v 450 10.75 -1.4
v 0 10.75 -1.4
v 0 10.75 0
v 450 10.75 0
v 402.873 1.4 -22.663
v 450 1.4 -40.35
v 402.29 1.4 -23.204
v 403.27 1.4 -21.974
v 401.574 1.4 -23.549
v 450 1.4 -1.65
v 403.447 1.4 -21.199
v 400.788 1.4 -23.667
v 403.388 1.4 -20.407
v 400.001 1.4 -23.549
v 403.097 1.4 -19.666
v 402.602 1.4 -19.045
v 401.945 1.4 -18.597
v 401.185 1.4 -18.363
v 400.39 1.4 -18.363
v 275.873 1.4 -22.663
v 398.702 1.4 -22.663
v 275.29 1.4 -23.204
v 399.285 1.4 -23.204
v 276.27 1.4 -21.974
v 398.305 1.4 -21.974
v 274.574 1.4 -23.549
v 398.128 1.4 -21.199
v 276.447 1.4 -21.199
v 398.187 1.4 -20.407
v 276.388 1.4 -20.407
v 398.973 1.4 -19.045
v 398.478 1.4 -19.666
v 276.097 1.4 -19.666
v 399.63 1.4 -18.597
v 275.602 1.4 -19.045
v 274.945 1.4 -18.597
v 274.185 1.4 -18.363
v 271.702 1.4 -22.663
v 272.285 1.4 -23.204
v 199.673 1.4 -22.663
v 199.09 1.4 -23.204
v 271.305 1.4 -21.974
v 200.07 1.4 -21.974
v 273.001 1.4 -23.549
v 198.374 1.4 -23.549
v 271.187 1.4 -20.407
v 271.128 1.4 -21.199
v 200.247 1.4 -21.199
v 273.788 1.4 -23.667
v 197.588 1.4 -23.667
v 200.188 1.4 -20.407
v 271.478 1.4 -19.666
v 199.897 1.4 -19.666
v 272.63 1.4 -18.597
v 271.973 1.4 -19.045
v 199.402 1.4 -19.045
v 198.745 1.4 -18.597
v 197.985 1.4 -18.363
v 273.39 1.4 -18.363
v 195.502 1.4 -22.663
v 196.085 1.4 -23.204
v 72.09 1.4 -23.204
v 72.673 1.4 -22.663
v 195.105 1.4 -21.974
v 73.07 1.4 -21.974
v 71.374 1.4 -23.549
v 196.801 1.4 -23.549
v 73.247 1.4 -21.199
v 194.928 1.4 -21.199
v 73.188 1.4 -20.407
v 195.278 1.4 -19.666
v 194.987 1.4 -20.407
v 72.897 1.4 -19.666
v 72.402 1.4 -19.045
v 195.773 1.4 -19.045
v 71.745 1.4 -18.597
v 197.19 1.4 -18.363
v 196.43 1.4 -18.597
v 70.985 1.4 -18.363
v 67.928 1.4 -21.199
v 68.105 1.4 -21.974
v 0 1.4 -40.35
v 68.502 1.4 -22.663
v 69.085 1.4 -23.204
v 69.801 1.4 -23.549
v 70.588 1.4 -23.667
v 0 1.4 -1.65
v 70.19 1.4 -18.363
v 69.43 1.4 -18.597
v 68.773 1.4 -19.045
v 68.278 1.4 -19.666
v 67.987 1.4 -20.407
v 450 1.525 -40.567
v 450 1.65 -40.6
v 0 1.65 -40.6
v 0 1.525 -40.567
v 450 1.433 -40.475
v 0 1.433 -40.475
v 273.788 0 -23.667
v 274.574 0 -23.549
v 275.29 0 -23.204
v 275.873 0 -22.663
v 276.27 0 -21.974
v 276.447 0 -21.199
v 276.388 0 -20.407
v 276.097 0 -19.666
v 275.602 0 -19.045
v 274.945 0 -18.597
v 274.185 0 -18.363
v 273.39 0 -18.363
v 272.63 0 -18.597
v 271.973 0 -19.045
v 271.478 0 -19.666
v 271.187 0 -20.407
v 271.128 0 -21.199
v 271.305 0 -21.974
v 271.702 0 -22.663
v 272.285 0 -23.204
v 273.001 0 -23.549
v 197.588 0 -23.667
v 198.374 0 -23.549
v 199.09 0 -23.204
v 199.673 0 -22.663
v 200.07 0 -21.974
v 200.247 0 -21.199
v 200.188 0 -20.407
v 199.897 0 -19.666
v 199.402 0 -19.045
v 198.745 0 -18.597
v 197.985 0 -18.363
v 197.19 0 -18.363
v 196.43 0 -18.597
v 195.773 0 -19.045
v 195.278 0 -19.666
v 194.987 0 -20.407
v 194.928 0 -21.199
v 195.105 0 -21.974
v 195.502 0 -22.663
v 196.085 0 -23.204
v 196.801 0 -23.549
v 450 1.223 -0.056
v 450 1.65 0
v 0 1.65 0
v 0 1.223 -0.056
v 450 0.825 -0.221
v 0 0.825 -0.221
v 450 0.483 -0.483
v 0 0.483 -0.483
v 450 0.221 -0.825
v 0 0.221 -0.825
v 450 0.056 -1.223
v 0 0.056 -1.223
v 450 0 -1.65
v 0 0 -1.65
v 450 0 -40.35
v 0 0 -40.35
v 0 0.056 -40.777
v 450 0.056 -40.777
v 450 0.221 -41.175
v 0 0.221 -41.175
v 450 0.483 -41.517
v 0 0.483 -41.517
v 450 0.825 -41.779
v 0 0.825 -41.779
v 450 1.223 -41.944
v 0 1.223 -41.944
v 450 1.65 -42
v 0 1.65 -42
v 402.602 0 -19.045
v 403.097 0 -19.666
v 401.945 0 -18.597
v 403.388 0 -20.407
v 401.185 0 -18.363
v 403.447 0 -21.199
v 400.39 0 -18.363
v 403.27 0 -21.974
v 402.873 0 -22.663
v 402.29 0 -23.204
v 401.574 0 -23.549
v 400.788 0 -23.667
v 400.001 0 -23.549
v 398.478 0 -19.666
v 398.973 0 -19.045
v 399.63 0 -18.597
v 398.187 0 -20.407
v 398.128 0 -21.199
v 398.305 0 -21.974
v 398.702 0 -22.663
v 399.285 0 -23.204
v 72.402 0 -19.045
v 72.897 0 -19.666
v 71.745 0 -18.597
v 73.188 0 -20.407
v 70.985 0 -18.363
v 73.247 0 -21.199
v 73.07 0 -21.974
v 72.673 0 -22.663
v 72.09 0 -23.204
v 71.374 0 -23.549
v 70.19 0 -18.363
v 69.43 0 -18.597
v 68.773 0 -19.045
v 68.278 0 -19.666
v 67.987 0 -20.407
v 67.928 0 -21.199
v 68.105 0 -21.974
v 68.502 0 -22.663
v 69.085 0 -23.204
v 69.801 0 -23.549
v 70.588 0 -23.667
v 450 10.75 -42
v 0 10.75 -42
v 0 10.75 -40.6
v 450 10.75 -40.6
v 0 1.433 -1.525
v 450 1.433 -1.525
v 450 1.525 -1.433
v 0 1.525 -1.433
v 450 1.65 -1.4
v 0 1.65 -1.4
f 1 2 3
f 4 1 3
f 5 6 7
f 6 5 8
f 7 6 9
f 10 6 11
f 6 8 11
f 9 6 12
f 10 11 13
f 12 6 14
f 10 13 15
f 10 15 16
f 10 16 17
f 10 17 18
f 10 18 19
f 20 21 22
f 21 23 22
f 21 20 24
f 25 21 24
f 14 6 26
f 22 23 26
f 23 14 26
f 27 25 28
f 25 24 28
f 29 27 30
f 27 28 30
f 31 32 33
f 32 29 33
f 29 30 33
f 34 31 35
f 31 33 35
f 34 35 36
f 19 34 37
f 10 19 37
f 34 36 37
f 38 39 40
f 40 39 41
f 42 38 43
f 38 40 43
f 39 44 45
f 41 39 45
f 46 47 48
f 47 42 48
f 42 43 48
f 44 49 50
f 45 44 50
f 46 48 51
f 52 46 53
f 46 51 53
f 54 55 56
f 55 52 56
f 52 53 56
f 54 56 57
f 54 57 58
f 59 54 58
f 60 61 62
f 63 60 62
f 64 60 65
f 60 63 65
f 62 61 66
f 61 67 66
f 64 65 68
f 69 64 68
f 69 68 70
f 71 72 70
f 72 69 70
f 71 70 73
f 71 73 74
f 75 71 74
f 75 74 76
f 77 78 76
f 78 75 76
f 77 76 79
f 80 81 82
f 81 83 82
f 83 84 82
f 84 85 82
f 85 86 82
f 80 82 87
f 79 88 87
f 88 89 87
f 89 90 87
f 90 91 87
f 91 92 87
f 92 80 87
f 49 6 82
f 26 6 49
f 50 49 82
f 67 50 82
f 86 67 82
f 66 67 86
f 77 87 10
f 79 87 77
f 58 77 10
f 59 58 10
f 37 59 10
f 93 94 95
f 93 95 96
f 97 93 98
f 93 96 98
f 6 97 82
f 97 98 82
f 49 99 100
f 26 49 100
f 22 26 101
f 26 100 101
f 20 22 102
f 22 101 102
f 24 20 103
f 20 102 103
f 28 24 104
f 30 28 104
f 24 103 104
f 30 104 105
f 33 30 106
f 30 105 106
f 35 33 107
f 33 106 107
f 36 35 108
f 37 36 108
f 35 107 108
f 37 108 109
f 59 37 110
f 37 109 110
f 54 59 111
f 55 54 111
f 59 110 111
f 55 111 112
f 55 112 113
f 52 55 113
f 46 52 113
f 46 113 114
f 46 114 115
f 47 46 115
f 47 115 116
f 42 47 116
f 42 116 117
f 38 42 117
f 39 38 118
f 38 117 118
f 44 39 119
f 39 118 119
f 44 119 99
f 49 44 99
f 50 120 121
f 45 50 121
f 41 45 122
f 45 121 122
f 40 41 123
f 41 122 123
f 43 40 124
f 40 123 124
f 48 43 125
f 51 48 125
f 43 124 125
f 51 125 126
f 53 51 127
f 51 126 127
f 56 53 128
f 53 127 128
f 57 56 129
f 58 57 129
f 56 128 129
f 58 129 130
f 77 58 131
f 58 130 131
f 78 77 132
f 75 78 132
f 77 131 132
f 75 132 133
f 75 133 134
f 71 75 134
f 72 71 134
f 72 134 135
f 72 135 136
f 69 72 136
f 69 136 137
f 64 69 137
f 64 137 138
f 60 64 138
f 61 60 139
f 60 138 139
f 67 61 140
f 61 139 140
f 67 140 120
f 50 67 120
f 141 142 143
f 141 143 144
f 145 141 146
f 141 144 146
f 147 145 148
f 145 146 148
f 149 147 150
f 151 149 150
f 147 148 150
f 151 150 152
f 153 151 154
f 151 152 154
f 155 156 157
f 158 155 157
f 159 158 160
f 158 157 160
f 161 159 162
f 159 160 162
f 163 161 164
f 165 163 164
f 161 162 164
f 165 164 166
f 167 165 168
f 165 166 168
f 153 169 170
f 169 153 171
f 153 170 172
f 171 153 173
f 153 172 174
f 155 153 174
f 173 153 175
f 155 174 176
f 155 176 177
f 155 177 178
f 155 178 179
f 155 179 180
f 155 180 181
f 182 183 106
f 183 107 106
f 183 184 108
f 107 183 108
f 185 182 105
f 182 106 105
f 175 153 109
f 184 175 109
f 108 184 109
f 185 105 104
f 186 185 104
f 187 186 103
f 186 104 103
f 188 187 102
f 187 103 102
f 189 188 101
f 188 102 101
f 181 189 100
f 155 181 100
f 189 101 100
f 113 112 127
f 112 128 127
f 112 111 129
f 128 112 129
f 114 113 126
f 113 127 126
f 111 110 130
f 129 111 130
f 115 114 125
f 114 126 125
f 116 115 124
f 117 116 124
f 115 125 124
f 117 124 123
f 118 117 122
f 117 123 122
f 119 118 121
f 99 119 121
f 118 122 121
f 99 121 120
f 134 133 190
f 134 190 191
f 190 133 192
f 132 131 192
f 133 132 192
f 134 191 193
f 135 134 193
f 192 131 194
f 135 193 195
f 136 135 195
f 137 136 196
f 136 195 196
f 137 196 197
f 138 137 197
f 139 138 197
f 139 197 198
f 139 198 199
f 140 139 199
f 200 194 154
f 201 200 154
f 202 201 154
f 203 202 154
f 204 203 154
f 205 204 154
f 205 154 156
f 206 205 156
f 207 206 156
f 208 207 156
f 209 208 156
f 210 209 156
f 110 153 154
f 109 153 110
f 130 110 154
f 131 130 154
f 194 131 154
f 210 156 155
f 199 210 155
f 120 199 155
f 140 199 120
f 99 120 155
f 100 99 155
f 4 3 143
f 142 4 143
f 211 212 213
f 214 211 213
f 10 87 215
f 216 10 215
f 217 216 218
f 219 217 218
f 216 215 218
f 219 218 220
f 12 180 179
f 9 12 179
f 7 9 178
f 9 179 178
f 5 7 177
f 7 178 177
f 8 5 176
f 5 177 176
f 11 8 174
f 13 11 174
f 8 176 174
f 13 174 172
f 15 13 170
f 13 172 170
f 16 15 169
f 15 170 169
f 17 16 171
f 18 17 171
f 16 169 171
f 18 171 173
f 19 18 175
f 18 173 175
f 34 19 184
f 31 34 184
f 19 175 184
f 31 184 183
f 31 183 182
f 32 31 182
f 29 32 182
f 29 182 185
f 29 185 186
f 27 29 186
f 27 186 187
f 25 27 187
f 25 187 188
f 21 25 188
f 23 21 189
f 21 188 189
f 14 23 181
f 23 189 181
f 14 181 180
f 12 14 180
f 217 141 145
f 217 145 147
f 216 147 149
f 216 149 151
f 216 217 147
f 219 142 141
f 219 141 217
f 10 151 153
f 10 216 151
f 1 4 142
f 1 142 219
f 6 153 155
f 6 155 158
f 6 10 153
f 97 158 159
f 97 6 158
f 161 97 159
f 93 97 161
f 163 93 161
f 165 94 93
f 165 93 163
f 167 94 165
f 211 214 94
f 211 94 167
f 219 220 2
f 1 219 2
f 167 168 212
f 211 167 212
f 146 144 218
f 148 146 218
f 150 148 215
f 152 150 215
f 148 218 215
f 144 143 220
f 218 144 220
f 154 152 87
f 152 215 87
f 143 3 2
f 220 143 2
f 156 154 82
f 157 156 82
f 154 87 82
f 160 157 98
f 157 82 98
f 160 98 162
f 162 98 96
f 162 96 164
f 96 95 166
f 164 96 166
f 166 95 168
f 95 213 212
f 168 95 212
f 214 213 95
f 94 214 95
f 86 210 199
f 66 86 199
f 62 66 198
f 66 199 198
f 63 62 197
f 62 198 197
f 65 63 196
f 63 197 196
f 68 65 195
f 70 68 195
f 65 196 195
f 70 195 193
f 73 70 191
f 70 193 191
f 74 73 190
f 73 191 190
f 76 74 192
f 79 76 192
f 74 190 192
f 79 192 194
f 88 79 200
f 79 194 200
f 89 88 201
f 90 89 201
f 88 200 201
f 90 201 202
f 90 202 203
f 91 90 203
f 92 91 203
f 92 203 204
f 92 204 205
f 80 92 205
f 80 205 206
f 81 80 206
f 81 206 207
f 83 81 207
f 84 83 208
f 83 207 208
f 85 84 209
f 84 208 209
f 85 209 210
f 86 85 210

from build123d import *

# Parameters (mm, degrees)
BASE_FLANGE1_DEPTH = 450
SKETCH6_R          = 2.667
CUT_EXTRUDE1_DEPTH = 1.4


# Sheet-metal steps are written as plain solids
with BuildPart() as part:
    # Sketch1 → Base-Flange1 (new body)
    with BuildSketch(Plane(origin=(0, 0, 0), x_dir=(0, 0, -1), z_dir=(1, 0, 0))):
        with BuildLine():
            Line((0, 10.75), (0, 1.65))
            ThreePointArc((0, 1.65), (0.483273811, 0.483273811), (1.65, 0))
            Line((1.65, 0), (40.35, 0))
            ThreePointArc((40.35, 0), (41.516726189, 0.483273811), (42, 1.65))
            Line((42, 1.65), (42, 10.75))
            Line((42, 10.75), (40.6, 10.75))
            Line((40.6, 10.75), (40.6, 1.65))
            ThreePointArc((40.6, 1.65), (40.526776695, 1.473223305), (40.35, 1.4))
            Line((40.35, 1.4), (1.65, 1.4))
            ThreePointArc((1.65, 1.4), (1.473223305, 1.473223305), (1.4, 1.65))
            Line((1.4, 1.65), (1.4, 10.75))
            Line((1.4, 10.75), (0, 10.75))
        make_face()
    extrude(amount=BASE_FLANGE1_DEPTH)

    # Sketch6 → Cut-Extrude1 (cut)
    with BuildSketch(Plane.XZ):
        with Locations(Location((400.7875, -21, 0), (0, 0, 270))):
            Circle(SKETCH6_R)
        with Locations(Location((273.7875, -21, 0), (0, 0, 270))):
            Circle(SKETCH6_R)
        with Locations(Location((197.5875, -21, 0), (0, 0, 270))):
            Circle(SKETCH6_R)
        with Locations(Location((70.5875, -21, 0), (0, 0, 270))):
            Circle(SKETCH6_R)
    extrude(amount=-CUT_EXTRUDE1_DEPTH, mode=Mode.SUBTRACT)


solid = part.part
